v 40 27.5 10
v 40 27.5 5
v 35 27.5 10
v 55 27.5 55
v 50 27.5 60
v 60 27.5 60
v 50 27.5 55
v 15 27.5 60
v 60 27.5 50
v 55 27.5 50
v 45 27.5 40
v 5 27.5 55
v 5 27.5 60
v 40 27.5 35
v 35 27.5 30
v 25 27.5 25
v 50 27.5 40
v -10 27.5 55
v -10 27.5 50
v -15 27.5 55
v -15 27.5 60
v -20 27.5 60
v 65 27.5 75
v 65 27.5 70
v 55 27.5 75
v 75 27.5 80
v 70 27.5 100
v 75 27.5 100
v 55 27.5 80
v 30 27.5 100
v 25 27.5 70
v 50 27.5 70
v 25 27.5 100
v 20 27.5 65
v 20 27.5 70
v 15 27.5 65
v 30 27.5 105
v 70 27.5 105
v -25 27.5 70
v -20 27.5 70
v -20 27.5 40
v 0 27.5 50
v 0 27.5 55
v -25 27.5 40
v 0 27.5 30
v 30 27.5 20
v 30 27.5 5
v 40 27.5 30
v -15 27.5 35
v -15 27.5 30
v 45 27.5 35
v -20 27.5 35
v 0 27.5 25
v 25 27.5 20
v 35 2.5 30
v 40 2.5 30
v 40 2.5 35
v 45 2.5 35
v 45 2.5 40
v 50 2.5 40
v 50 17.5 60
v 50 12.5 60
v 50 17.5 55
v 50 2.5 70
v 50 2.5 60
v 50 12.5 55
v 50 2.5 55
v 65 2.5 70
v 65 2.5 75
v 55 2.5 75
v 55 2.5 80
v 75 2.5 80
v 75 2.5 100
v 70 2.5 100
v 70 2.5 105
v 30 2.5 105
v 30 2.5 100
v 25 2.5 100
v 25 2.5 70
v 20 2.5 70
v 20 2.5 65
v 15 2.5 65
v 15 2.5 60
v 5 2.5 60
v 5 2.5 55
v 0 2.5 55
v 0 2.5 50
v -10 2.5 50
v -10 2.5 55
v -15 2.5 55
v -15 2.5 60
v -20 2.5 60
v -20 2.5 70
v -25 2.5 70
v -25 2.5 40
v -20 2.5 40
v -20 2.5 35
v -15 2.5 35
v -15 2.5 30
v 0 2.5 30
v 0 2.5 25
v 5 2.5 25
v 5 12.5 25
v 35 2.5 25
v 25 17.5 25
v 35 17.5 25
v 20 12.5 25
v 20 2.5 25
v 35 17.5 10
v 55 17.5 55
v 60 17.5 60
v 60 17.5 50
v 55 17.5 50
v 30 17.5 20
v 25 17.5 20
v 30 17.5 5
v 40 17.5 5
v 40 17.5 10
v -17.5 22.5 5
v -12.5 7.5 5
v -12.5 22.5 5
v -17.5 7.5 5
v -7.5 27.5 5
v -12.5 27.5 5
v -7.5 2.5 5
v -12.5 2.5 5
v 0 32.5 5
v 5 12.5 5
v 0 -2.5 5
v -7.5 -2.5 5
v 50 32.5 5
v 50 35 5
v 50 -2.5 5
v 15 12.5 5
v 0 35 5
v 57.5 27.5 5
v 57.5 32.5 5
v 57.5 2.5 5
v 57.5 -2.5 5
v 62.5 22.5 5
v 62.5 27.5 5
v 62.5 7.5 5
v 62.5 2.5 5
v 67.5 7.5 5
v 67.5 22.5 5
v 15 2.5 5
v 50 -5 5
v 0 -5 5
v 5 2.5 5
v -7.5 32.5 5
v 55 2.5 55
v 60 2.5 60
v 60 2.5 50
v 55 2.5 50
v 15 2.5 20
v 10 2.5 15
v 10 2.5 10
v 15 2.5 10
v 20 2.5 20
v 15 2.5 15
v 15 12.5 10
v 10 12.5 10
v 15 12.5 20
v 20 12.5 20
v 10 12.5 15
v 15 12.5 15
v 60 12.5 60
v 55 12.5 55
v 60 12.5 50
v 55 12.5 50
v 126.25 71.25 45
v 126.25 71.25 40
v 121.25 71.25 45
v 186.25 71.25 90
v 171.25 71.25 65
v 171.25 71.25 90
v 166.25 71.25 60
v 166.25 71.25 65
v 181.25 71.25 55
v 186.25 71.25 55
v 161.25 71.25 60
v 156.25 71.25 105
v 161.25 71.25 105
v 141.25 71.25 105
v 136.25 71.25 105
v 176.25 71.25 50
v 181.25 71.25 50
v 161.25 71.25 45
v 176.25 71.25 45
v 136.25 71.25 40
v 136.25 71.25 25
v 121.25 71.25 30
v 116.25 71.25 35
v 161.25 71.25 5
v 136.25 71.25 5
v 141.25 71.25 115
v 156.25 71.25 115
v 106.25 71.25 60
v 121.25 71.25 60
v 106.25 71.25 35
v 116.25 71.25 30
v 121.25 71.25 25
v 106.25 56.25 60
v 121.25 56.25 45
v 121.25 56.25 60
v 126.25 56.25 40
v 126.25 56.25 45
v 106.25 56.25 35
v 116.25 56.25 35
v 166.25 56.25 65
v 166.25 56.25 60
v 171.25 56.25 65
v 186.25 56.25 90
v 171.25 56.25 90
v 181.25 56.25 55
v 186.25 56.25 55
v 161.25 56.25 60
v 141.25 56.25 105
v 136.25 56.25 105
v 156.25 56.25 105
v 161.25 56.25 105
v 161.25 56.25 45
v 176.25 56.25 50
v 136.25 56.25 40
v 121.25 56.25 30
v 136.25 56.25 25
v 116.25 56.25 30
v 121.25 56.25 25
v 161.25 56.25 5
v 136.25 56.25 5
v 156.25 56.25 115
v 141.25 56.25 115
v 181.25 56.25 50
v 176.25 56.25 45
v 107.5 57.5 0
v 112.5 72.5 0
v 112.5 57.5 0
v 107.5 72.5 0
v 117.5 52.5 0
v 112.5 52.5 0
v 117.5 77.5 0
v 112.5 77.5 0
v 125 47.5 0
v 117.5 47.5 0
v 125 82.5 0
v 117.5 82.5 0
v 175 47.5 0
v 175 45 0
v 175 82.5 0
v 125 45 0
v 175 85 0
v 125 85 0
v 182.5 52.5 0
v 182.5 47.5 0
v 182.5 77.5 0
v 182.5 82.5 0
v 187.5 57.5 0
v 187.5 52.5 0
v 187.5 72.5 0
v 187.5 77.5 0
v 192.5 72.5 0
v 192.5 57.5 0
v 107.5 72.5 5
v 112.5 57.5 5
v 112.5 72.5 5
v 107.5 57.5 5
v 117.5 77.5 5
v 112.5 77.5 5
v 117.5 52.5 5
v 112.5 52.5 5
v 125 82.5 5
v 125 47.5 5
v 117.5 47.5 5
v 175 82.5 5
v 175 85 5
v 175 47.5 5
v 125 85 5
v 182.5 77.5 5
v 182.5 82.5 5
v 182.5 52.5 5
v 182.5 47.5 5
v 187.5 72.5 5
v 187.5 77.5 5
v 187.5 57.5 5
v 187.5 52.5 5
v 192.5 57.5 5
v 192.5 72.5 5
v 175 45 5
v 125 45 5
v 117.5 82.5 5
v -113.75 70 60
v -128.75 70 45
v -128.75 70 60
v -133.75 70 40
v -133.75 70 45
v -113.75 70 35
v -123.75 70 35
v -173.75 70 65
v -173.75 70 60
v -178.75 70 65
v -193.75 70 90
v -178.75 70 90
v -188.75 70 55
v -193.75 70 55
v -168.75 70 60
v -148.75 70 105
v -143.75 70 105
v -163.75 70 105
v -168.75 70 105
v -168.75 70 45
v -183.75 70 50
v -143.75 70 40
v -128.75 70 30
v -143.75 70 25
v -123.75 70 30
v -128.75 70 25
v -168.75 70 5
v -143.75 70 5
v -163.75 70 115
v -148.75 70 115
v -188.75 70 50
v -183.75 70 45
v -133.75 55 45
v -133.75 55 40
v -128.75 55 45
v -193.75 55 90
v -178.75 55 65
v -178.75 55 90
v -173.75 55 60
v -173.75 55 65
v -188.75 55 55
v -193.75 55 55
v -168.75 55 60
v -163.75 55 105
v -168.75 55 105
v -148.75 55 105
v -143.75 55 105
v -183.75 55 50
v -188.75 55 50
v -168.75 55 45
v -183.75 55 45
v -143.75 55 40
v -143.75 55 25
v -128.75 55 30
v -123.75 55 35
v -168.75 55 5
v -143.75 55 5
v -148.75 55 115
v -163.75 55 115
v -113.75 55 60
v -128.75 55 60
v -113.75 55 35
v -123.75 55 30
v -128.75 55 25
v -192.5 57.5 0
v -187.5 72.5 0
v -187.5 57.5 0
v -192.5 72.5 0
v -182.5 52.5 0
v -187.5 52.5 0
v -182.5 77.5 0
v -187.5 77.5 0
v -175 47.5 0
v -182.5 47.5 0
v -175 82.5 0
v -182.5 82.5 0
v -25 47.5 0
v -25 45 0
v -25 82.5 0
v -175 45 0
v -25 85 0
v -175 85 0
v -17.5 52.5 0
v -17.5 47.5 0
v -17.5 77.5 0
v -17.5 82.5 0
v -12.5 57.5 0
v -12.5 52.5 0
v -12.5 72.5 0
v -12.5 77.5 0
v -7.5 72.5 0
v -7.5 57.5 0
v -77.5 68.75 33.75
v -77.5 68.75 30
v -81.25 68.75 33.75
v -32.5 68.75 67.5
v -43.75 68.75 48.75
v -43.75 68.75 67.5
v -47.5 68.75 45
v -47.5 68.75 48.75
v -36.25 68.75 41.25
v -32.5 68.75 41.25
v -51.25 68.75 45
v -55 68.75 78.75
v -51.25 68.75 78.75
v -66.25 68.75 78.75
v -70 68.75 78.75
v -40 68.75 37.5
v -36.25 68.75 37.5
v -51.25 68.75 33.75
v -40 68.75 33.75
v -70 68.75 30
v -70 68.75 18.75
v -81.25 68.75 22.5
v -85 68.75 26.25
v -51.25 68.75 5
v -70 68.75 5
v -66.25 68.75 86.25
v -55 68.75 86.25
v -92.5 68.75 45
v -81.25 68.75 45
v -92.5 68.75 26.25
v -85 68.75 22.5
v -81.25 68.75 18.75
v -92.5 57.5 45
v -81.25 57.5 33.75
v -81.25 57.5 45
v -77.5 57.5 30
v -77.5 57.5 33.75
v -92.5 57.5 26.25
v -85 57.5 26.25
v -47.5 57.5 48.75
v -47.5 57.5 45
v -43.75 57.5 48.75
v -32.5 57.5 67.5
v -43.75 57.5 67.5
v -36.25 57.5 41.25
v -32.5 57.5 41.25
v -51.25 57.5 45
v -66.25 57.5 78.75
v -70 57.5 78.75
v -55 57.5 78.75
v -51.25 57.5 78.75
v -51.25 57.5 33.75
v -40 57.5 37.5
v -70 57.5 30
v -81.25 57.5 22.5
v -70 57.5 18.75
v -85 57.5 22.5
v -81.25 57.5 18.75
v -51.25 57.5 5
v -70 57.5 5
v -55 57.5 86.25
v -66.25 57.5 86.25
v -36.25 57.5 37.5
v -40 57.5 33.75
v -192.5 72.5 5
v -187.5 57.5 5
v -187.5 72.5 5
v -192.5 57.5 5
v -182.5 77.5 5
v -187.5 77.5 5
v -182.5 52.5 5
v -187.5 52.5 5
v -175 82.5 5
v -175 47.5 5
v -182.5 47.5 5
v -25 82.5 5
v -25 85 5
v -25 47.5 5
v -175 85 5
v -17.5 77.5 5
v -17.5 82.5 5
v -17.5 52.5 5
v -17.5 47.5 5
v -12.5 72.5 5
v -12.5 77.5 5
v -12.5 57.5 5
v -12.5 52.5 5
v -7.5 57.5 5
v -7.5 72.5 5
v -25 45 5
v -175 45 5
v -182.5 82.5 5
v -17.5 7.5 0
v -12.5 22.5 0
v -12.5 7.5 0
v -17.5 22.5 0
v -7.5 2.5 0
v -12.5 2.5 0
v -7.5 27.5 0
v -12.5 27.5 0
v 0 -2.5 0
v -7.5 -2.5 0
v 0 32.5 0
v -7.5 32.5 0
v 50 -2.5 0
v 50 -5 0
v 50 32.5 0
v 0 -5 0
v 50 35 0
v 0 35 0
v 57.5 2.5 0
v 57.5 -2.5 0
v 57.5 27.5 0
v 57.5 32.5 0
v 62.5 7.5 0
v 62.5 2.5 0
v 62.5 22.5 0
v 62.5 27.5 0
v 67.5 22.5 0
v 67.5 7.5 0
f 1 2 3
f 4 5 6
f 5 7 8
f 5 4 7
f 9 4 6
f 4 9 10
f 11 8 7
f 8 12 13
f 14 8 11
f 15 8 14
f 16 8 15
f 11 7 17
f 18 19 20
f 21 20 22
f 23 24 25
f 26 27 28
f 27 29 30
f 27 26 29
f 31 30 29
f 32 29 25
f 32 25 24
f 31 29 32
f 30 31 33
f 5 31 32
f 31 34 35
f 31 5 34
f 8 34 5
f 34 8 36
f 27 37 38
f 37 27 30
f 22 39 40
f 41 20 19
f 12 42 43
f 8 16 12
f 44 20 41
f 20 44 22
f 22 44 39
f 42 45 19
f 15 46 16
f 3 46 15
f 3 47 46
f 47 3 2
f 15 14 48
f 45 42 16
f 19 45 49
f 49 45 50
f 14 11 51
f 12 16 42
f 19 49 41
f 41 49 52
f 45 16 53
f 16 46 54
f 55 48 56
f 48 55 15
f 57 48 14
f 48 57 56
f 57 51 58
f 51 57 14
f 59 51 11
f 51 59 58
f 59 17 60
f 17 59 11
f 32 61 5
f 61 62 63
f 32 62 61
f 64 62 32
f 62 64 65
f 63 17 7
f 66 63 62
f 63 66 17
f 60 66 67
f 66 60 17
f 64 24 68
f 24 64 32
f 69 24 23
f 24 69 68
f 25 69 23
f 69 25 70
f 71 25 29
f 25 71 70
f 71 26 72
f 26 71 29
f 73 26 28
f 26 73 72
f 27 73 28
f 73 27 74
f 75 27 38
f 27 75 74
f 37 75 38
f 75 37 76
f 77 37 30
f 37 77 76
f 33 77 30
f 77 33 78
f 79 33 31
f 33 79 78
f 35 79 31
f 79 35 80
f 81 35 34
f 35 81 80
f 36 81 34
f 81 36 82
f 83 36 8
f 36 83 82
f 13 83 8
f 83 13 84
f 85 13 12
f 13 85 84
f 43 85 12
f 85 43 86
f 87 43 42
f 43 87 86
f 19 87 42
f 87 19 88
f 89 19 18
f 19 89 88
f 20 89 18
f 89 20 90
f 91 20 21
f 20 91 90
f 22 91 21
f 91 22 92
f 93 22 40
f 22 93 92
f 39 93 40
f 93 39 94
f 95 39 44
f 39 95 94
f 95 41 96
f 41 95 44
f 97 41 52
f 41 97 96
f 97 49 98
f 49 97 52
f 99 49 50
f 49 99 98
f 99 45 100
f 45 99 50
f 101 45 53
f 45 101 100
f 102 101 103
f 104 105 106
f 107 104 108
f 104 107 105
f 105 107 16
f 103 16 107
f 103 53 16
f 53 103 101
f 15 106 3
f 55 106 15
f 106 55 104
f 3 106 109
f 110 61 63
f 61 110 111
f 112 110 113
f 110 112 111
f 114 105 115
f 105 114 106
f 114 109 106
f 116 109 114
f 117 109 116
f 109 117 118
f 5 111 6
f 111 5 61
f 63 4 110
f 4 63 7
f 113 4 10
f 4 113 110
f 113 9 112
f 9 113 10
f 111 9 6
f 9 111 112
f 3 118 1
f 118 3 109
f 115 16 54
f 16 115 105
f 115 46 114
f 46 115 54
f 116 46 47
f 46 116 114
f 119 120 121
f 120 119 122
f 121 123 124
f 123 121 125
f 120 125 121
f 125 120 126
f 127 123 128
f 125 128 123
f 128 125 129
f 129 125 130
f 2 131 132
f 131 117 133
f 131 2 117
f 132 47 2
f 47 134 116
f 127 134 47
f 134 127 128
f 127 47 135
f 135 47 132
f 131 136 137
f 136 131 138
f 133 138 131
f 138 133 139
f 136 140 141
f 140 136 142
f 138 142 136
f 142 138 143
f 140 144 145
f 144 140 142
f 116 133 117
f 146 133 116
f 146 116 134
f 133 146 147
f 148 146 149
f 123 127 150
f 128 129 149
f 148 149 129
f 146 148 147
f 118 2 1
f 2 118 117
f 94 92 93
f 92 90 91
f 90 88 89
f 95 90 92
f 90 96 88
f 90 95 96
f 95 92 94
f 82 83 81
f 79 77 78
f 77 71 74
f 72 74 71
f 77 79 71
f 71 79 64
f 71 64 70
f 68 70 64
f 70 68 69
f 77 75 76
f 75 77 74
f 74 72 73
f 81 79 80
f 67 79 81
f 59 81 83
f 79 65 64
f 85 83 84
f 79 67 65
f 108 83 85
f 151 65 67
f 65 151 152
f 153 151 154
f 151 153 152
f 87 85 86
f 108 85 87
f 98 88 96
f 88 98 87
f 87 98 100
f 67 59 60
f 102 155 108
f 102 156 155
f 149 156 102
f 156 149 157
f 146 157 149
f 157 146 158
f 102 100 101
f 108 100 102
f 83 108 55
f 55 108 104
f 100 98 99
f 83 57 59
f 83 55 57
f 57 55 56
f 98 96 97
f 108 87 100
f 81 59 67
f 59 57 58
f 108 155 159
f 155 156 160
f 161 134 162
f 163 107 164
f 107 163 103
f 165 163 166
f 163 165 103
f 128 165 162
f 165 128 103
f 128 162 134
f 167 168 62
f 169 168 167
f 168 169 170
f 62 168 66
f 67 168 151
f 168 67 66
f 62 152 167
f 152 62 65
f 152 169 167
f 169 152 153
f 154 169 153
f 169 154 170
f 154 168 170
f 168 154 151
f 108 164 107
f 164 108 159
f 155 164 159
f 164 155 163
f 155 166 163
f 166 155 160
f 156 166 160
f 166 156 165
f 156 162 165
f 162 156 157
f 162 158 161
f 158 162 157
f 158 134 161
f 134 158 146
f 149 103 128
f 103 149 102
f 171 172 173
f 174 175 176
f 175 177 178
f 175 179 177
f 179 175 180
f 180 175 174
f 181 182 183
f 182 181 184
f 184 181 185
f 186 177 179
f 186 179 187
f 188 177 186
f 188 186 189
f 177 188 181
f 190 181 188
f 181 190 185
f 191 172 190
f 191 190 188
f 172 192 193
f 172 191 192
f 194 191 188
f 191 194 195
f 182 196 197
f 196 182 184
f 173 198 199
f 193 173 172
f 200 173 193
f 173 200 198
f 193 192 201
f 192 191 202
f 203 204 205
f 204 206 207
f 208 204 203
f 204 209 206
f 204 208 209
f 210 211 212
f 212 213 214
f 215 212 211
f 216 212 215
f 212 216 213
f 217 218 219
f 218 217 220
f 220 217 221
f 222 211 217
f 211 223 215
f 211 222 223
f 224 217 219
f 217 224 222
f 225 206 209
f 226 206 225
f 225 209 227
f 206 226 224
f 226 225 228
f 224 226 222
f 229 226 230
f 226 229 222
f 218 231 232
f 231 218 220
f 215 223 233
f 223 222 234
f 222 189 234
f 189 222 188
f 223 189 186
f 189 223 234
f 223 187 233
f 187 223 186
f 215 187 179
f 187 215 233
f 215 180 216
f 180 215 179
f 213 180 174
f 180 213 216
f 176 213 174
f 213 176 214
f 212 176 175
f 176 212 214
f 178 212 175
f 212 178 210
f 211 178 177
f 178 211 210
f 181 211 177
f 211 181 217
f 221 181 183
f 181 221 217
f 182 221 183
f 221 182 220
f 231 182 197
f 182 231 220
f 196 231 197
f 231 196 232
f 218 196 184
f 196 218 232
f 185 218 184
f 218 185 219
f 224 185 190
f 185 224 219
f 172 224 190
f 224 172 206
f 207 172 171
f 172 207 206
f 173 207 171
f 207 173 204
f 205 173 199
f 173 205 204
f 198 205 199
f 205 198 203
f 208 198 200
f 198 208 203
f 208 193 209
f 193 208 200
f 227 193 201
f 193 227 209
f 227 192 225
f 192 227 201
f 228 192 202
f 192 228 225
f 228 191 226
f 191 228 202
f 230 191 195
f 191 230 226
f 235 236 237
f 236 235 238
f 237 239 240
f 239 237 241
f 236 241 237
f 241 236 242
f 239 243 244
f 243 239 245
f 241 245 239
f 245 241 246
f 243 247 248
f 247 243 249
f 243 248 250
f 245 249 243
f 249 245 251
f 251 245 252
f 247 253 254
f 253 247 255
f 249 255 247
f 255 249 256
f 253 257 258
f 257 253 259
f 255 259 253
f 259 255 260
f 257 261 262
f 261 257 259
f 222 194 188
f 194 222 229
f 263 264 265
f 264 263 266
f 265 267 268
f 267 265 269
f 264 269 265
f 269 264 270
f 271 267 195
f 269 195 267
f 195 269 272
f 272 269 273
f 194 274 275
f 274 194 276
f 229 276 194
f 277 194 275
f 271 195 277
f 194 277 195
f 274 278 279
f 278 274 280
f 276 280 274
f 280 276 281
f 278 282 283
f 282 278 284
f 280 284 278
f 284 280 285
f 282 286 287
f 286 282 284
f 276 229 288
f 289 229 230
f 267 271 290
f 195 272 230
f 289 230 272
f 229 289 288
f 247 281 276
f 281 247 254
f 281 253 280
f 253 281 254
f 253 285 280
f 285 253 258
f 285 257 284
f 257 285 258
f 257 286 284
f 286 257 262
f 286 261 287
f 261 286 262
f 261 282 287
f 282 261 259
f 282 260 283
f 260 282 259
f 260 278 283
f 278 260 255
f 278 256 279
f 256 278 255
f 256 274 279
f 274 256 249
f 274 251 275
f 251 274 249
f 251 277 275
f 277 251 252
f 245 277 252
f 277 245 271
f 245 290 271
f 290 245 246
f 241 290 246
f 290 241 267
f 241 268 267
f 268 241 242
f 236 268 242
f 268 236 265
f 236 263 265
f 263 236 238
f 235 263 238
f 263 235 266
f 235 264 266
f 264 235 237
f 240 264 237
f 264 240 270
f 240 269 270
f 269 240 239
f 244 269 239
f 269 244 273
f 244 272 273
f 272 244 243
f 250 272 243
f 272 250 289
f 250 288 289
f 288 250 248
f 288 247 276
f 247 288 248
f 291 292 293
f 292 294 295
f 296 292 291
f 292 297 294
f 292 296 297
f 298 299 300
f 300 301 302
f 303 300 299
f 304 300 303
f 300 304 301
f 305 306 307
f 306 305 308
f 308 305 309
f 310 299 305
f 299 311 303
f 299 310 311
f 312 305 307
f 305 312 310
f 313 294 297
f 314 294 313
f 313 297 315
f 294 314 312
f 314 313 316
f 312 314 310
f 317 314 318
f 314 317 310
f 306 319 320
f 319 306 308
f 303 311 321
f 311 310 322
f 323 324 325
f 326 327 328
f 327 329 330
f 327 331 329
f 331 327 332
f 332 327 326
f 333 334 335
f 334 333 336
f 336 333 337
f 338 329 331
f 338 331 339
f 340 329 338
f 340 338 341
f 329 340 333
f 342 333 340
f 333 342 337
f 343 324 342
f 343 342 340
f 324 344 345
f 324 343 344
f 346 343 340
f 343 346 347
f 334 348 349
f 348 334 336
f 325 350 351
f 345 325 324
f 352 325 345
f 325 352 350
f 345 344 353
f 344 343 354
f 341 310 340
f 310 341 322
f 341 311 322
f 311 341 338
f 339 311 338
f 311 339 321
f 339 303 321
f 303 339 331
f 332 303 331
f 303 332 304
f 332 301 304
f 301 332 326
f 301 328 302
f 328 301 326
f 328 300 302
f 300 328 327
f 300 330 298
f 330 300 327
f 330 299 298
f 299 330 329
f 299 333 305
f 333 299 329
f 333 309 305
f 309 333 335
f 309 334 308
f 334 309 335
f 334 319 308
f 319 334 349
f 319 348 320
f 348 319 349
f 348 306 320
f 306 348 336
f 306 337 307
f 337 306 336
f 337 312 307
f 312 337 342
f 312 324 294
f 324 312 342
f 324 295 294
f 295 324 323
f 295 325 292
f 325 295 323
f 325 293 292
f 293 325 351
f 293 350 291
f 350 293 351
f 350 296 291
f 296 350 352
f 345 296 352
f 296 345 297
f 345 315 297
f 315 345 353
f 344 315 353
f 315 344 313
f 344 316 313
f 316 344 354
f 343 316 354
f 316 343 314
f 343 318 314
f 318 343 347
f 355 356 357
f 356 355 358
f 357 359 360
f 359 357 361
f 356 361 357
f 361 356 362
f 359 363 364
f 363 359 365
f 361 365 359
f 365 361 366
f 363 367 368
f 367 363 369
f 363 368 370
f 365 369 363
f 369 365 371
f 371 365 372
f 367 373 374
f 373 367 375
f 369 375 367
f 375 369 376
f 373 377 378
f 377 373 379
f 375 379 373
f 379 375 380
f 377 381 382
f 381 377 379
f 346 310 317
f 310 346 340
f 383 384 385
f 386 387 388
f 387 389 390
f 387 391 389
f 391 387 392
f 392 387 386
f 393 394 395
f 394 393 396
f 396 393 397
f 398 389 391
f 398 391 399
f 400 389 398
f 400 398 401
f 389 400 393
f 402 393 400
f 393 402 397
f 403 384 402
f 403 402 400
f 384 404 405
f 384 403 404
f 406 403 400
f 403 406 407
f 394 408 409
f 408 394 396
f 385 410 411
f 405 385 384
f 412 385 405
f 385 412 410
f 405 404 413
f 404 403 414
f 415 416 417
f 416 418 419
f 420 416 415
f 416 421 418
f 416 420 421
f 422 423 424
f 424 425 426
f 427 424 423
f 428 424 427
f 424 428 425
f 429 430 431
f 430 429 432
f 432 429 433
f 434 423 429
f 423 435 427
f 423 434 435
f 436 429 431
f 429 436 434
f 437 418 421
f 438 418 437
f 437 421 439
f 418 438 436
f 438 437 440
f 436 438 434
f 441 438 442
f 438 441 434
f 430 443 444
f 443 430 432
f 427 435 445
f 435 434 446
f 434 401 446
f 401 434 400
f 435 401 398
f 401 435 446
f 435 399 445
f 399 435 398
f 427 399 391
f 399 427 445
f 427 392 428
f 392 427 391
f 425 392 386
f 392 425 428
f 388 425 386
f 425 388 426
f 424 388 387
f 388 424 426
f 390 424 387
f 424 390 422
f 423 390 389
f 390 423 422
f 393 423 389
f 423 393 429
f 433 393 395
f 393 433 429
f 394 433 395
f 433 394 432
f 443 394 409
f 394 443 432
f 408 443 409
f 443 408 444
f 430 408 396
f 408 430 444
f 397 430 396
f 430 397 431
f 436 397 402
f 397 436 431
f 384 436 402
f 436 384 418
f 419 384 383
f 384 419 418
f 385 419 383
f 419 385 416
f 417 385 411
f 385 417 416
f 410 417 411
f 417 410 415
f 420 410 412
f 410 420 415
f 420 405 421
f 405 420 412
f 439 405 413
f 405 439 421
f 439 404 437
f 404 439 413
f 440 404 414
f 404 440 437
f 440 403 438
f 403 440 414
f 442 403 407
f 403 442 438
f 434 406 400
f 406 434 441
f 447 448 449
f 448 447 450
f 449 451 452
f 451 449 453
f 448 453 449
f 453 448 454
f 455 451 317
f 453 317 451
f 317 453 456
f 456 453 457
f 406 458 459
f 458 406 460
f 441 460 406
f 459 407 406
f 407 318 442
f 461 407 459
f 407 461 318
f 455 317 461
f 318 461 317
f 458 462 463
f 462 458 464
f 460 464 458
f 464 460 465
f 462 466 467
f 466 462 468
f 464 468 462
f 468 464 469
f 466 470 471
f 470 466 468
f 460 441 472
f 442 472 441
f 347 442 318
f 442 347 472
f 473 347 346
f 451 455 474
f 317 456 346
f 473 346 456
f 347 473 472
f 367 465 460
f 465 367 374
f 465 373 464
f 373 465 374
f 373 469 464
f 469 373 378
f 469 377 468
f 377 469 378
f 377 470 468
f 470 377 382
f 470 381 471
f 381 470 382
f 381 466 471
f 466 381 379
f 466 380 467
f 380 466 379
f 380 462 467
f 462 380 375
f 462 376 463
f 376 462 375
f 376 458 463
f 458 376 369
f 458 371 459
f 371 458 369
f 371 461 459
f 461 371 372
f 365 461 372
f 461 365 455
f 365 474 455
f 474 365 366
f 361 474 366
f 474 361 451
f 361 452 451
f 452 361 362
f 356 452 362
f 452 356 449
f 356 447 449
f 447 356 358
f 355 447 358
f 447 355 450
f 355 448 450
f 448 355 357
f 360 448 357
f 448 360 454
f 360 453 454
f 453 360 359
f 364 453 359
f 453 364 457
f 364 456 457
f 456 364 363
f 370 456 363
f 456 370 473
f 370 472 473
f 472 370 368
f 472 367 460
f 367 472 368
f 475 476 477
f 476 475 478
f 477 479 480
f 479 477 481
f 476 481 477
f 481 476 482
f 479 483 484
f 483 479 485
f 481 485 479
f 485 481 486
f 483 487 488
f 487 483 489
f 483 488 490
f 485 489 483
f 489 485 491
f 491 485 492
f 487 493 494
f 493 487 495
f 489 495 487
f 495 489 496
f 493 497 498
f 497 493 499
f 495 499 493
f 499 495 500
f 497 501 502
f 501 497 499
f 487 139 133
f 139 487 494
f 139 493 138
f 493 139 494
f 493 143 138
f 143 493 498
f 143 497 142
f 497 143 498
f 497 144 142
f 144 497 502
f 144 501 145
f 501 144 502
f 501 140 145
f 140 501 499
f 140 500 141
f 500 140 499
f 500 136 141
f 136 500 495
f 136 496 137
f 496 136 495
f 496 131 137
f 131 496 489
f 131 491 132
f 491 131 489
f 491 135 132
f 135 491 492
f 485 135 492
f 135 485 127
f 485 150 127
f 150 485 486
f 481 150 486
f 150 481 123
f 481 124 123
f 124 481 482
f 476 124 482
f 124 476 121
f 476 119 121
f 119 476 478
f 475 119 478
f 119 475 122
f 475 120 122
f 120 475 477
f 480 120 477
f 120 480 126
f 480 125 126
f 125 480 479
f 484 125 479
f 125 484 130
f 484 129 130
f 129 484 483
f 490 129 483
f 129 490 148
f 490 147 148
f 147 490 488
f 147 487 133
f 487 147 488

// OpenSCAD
w = 5;
merged_dino = false;
eye_spacing = 0.4;
base_x_blocks = 10;
base_y_blocks = 6;

part = "DEMO"; // [DINO, EYE, CACTUS, BASE, DEMO]

module chrome_dino(w, merged = false) {
    module body(w) {
        difference() {
            polygon([
                [0, 0],
                [0, w],
                [-3 * w, w],
                [-3 * w, 2 * w],
                [-4 * w, 2 * w],
                [-4 * w, 3 * w],
                [-5 * w, 3 * w],
                [-5 * w, 9 * w],
                [-4 * w, 9 * w],
                [-4 * w, 7 * w],
                [-3 * w, 7 * w],
                [-3 * w, 6 * w],
                [-2 * w, 6 * w],
                [-2 * w, 5 * w],
                [0, 5 * w],
                [0, 6 * w],
                [w, 6 * w],
                [w, 7 * w],
                [3 * w, 7 * w],
                [3 * w, 8 * w],
                [4 * w, 8 * w],
                [4 * w, 9 * w],
                [5 * w, 9 * w],
                [5 * w, 15 * w],
                [6 * w, 15 * w],
                [6 * w, 16 * w],
                [14 * w, 16 * w],
                [14 * w, 15 * w],
                [15 * w, 15 * w],
                [15 * w, 11 * w],
                [11 * w, 11 * w],
                [11 * w, 10 * w],
                [13 * w, 10 * w],
                [13 * w, 9 * w],
                [10 * w, 9 * w],
                [10 * w, 3 * w],
                [9 * w, 3 * w],
                [9 * w, 2 * w],
                [8 * w, 2 * w],
                [8 * w, w],
                [7 * w, w],
                [7 * w, 0],
            ]); 
        
          translate([7 * w, 14 * w]) square(w, center = true);
        }
    }

    module hand(w) {
        polygon([
            [10 * w, 7 * w],
            [12 * w, 7 * w],
            [12 * w, 5 * w],
            [11 * w, 5 * w],
            [11 * w, 6 * w],
            [10 * w, 6 * w]
        ]);
    }

    module leg_l(w) {
        polygon([
            [5 * w, 0],
            [5 * w, -w],
            [6 * w, -w],
            [6 * w, -4 * w],
            [8 * w, -4 * w],
            [8 * w, -3 * w],
            [7 * w, -3 * w],
            [7 * w, 0],
        ]);
    }

    module leg_r(w) {
        polygon([
            [w, 0],
            [w, -4 * w],
            [3 * w, -4 * w],
            [3 * w, -3 * w],
            [2 * w, -3 * w],
            [2 * w, -2 * w],
            [3 * w, -2 * w],
            [3 * w, -w],
            [4 * w, -w],
            [4 * w, 0]
        ]);
    }

    module dino_left(w) {      
        linear_extrude(w * 2.5) body(w);
        linear_extrude(w * 2) {
            hand(w);
            leg_l(w);
        }
    }

    module dino_right(w) {
        linear_extrude(w * 2.5) mirror([1, 0, 0]) body(w);
        linear_extrude(w * 2) mirror([1, 0, 0]) {
            hand(w);
            leg_r(w);
        }
    }
    
    if(merged) {
        dino_left(w);
        translate([0, 0, w * 5]) rotate([0, 180, 0]) dino_right(w);
    } else {
        translate([w * 6, 0, 0]) dino_left(w);
        translate([w * -6, 0, 0]) dino_right(w);
    }
}

module cactus(w) {
    linear_extrude(w * 3) {
        translate([2 * w, w * 7]) scale(w) 
        for(pt = px_polygon([
            [0, 2],
            [3, 2],
            [5, 4],
            [5, 10],
            [5, 10],
            [3, 10],
            [3, 6],
            [0, 4],
            
        ], filled = true)) {
            translate(pt) square(1);
        }
        translate([-2 * w, w * 5]) scale(w) 
        for(pt = px_polygon([
            [-1, 0],
            [-3, 0],
            [-6, 2],
            [-6, 6],
            [-6, 6],
            [-4, 6],
            [-4, 4],
            [-1, 2],
            
        ], filled = true)) {
            translate(pt) square(1);
        }
        scale(w) 
        for(pt = px_polygon([
            [-2, 0],
            [2, 0],
            [2, 20],
            [1, 22],
            [0, 22],
            [-1, 22],
            [-2, 20]
        ], filled = true)) {
            translate(pt) square(1);
        }
    }
}

module base(w, base_x_blocks, base_y_blocks) {
   linear_extrude(w) {
       translate([0, -w]) 
           square([base_x_blocks * w, base_y_blocks * w + 2 * w]);
       translate([0, base_y_blocks * w / 2]) scale(w)
       for(p = px_circle(base_y_blocks / 2, filled = true)) {
           translate(p)
               square(1, center = true);
       }
       translate([base_x_blocks * w, base_y_blocks * w / 2]) scale(w)
       for(p = px_circle(base_y_blocks / 2, filled = true)) {
           translate(p)
               square(1, center = true);
       }
   }   
}

module eye(w, eye_spacing) {
    translate([0, 0, -eye_spacing]) 
        rotate([0, -90, 0]) 
            linear_extrude(w * 5) 
                offset(delta = -eye_spacing) square(w);
}

if(part == "DINO") {
    chrome_dino(w, merged_dino);
}
else if(part == "EYE") {
    eye(w, eye_spacing);
}
else if(part == "CACTUS") {
    cactus(w);
}
else if(part == "BASE") { 
   base(w, base_x_blocks, base_y_blocks);
}
else if(part == "DEMO") {
    wd = 5;
    translate([0, wd * 5.5, wd * 5]) rotate([90, 0, 0])  {
        color("DimGray") chrome_dino(wd, true);
        color("white") 
            linear_extrude(wd * 5)
                translate([7 * wd, 14 * wd]) square(wd, center = true);
    }
    color("white") base(wd, 10, 6);
    
    translate([wd * 25, wd * 10, 0]) {
        translate([wd * 4.25, wd * 4.25, 0]) color("SlateGray") rotate([90, 0, 0])  
            cactus(wd);
        color("white") base(wd, 10, 6);
    }
    
    translate([-wd * 35, wd * 10, 0]) {
        color("SlateGray") {
            translate([wd * 4.25, wd * 4, 0]) rotate([90, 0, 0])  
                mirror([1, 0, 0]) cactus(wd);
                
             scale(0.75)
                 translate([wd * 30, wd * 5, 0]) rotate([90, 0, 0])  
                    cactus(wd);       
        }
         color("white") base(wd, 30, 6);                
    }
    
}

    
/**
 * The dotSCAD library
 * @copyright Justin Lin, 2017
 * @license https://opensource.org/licenses/lgpl-3.0.html
 *
 * @see https://github.com/JustinSDK/dotSCAD
*/

/**
* in_shape.scad
*
* @copyright Justin Lin, 2019
* @license https://opensource.org/licenses/lgpl-3.0.html
*
* @see https://openhome.cc/eGossip/OpenSCAD/lib-in_shape.html
*
**/


function _in_shape_in_line_equation(edge, pt) = 
    let(
        x1 = edge[0][0],
        y1 = edge[0][1],
        x2 = edge[1][0],
        y2 = edge[1][1],
        a = (y2 - y1) / (x2 - x1),
        b = y1 - a * x1
    )
    (pt[1] == a * pt[0] + b);

function _in_shape_in_any_edges(edges, pt, epsilon) = 
    let(
        leng = len(edges),
        maybe_last = [for(i = 0; i < leng && !__in_line(edges[i], pt, epsilon); i = i + 1) i][leng - 1] 
    )
    is_undef(maybe_last);

function _in_shape_interpolate_x(y, p1, p2) = 
    p1[1] == p2[1] ? p1[0] : (
        p1[0] + (p2[0] - p1[0]) * (y - p1[1]) / (p2[1] - p1[1])
    );
    
function _in_shape_does_pt_cross(pts, i, j, pt) = 
    ((pts[i][1] > pt[1]) != (pts[j][1] > pt[1])) &&
    (pt[0] < _in_shape_interpolate_x(pt[1], pts[i], pts[j]));
    

function _in_shape_sub(shapt_pts, leng, pt, cond, i, j) =
    j == leng ? cond : (
        _in_shape_does_pt_cross(shapt_pts, i, j, pt) ? 
            _in_shape_sub(shapt_pts, leng, pt, !cond, j, j + 1) :
            _in_shape_sub(shapt_pts, leng, pt, cond, j, j + 1)
    );
 
function in_shape(shapt_pts, pt, include_edge = false, epsilon = 0.0001) = 
    let(
        leng = len(shapt_pts),
        edges = __lines_from(shapt_pts, true)
    )
    _in_shape_in_any_edges(edges, pt, epsilon) ? include_edge : 
    _in_shape_sub(shapt_pts, leng, pt, false, leng - 1, 0);

/**
* px_polygon.scad
*
* @copyright Justin Lin, 2019
* @license https://opensource.org/licenses/lgpl-3.0.html
*
* @see https://openhome.cc/eGossip/OpenSCAD/lib2-px_polygon.html
*
**/ 

function px_polygon(points, filled = false) =
    filled ?
    let(
        xs = [for(pt = points) pt[0]],
        ys = [for(pt = points) pt[1]],
        max_x = max(xs),
        min_x = min(xs),
        max_y = max(ys),
        min_y = min(ys)
    )
    [
        for(y = min_y; y <= max_y; y = y + 1)
            for(x = min_x; x <= max_x; x = x + 1)
                let(pt = [x, y])
                if(in_shape(points, pt, true)) pt
    ]
    : 
    px_polyline(
        concat(points, [points[len(points) - 1], points[0]])
    );
    

function __in_line(line_pts, pt, epsilon = 0.0001) =
    let(
        pts = len(line_pts[0]) == 2 ? [for(p = line_pts) __to3d(p)] : line_pts,
        pt3d = len(pt) == 2 ? __to3d(pt) : pt,
        v1 = pts[0] - pt3d, 
        v2 = pts[1] - pt3d
    )
    (norm(cross(v1, v2)) < epsilon) && ((v1 * v2) <= epsilon);

/**
* px_polyline.scad
*
* @copyright Justin Lin, 2019
* @license https://opensource.org/licenses/lgpl-3.0.html
*
* @see https://openhome.cc/eGossip/OpenSCAD/lib2-px_polyline.html
*
**/ 


function px_polyline(points) =
    let(
        is_2d = len(points[0]) == 2,
        pts = is_2d ? [for(pt = points) __to3d(pt)] : points,
        polyline = [for(line =  __lines_from(pts)) each px_line(line[0], line[1])]
    )
    is_2d ? [for(pt = polyline) __to2d(pt)] : polyline;

/**
* px_line.scad
*
* @copyright Justin Lin, 2019
* @license https://opensource.org/licenses/lgpl-3.0.html
*
* @see https://openhome.cc/eGossip/OpenSCAD/lib2-px_line.html
*
**/ 


function _px_line_zsgn(a) = a == 0 ? a : a / abs(a);
    
// x-dominant
function _px_line_xdominant_y(y, yd, sy) = yd >= 0 ? y + sy : y;
function _px_line_xdominant_yd(yd, ax, ay) = (yd >= 0 ? yd - ax : yd) + ay;
function _px_line_xdominant_z(z, zd, sz) = zd >= 0 ? z + sz : z;
function _px_line_xdominant_zd(zd, ax, az) = (zd >= 0 ? zd - ax : zd) + az;

function _px_line_xdominant(start, end, a, s) = 
    let(
        x = start[0],
        y = start[1],
        z = start[2],
        ax = a[0],
        ay = a[1],
        az = a[2],
        sx = s[0],
        sy = s[1],
        sz = s[2],        
        shrx = floor(ax / 2),
        yd = ay - shrx,
        zd = az - shrx,
        endx = end[0]
    )
    concat(
        [start], 
        _px_line_xdominant_sub(
            x + sx, 
            _px_line_xdominant_y(y, yd, sy), 
            _px_line_xdominant_z(z, zd, sz), 
            endx, 
            a, 
            s, 
            _px_line_xdominant_yd(yd, ax, ay), 
            _px_line_xdominant_zd(zd, ax, az)
        )
    );

function _px_line_xdominant_sub(x, y, z, endx, a, s, yd, zd) = 
    let(
        ax = a[0],
        ay = a[1],
        az = a[2],
        sx = s[0],
        sy = s[1],
        sz = s[2]
    )
    x == endx ? [] : 
        concat([[x, y, z]], 
            _px_line_xdominant_sub(
                x + sx, 
                _px_line_xdominant_y(y, yd, sy), 
                _px_line_xdominant_z(z, zd, sz), 
                endx, 
                a, 
                s, 
                _px_line_xdominant_yd(yd, ax, ay), 
                _px_line_xdominant_zd(zd, ax, az)
            )
        );
        
// y-dominant
function _px_line_ydominant_x(x, xd, sx) = xd >= 0 ? x + sx : x;
function _px_line_ydominant_xd(xd, ax, ay) = (xd >= 0 ? xd - ay : xd) + ax;
function _px_line_ydominant_z(z, zd, sz) = zd >= 0 ? z + sz : z;
function _px_line_ydominant_zd(zd, ay, az) = (zd >= 0 ? zd - ay : zd) + az;
        
function _px_line_ydominant(start, end, a, s) = 
    let(
        x = start[0],
        y = start[1],
        z = start[2],
        ax = a[0],
        ay = a[1],
        az = a[2],
        sx = s[0],
        sy = s[1],
        sz = s[2],        
        shry = floor(ay / 2),
        xd = ax - shry,
        zd = az - shry,
        endy = end[1]
    )
    concat(
        [start], 
        _px_line_ydominant_sub(
            _px_line_ydominant_x(x, xd, sx), 
            y + sy,
            _px_line_ydominant_z(z, zd, sz), 
            endy, 
            a, 
            s, 
            _px_line_ydominant_xd(xd, ax, ay), 
            _px_line_ydominant_zd(zd, ay, az)
        )
    );

function _px_line_ydominant_sub(x, y, z, endy, a, s, xd, zd) = 
    let(
        ax = a[0],
        ay = a[1],
        az = a[2],
        sx = s[0],
        sy = s[1],
        sz = s[2]
    )
    y == endy ? [] : 
        concat([[x, y, z]], 
            _px_line_ydominant_sub(
                _px_line_ydominant_x(x, xd, sx), 
                y + sy,
                _px_line_ydominant_z(z, zd, sz), 
                endy, 
                a, 
                s, 
                _px_line_ydominant_xd(xd, ax, ay), 
                _px_line_ydominant_zd(zd, ay, az)
            )
        );

// z-dominant
function _px_line_zdominant_x(x, xd, sx) = xd >= 0 ? x + sx : x;
function _px_line_zdominant_xd(xd, ax, az) = (xd >= 0 ? xd - az : xd) + ax;

function _px_line_zdominant_y(y, yd, sy) = yd >= 0 ? y + sy : y;
function _px_line_zdominant_yd(yd, ay, az) = (yd >= 0 ? yd - az : yd) + ay;
        
function _px_line_zdominant(start, end, a, s) = 
    let(
        x = start[0],
        y = start[1],
        z = start[2],
        ax = a[0],
        ay = a[1],
        az = a[2],
        sx = s[0],
        sy = s[1],
        sz = s[2],        
        shrz = floor(az / 2),
        xd = ax - shrz,
        yd = ay - shrz,
        endz = end[2]
    )
    concat(
        [start], 
        _px_line_zdominant_sub(
            _px_line_zdominant_x(x, xd, sx), 
            _px_line_zdominant_y(y, yd, sy), 
            z + sz,
            endz, 
            a, 
            s, 
            _px_line_zdominant_xd(xd, ax, az), 
            _px_line_zdominant_yd(yd, ay, az)
        )
    );

function _px_line_zdominant_sub(x, y, z, endz, a, s, xd, yd) = 
    let(
        ax = a[0],
        ay = a[1],
        az = a[2],
        sx = s[0],
        sy = s[1],
        sz = s[2]
    )
    z == endz ? [] : 
        concat([[x, y, z]], 
            _px_line_zdominant_sub(
                _px_line_zdominant_x(x, xd, sx), 
                _px_line_zdominant_y(y, yd, sy), 
                z + sz,
                endz, 
                a, 
                s, 
                _px_line_zdominant_xd(xd, ax, az), 
                _px_line_zdominant_yd(yd, ay, az)
            )
        );
        
function px_line(p1, p2) = 
    let(
        is_2d = len(p1) == 2,
        start_pt = is_2d ? __to3d(p1) : p1,
        end_pt = is_2d ? __to3d(p2) : p2,
        dt = end_pt - start_pt,
        ax = floor(abs(dt[0]) * 2),
        ay = floor(abs(dt[1]) * 2),
        az = floor(abs(dt[2]) * 2),
        sx = _px_line_zsgn(dt[0]),
        sy = _px_line_zsgn(dt[1]),
        sz = _px_line_zsgn(dt[2]),
        points = ax >= max(ay, az) ? _px_line_xdominant(start_pt, end_pt, [ax, ay, az], [sx, sy, sz]) : (
            ay >= max(ax, az) ? _px_line_ydominant(start_pt, end_pt, [ax, ay, az], [sx, sy, sz]) :
                _px_line_zdominant(start_pt, end_pt, [ax, ay, az], [sx, sy, sz])
        )
    )   
    is_2d ? [for(pt = points) __to2d(pt)] : points;

/**
* px_circle.scad
*
* @copyright Justin Lin, 2019
* @license https://opensource.org/licenses/lgpl-3.0.html
*
* @see https://openhome.cc/eGossip/OpenSCAD/lib2-px_circle.html
*
**/ 

function _px_circle_y(f, y) = f >= 0 ? y - 1 : y;
function _px_circle_ddf_y(f, ddf_y) = f >= 0 ? ddf_y + 2 : ddf_y;
function _px_circle_f(f, ddf_y) = f >= 0 ? f + ddf_y : f;

function _px_circle(f, ddf_x, ddf_y, x, y, filled) = 
    x >= y ? [] : 
    let(
        ny = _px_circle_y(f, y),
        nddf_y = _px_circle_ddf_y(f, ddf_y),
        nx = x + 1,
        nddf_x = ddf_x + 2,
        nf = _px_circle_f(f, ddf_y) + nddf_x
    )
    concat(
        filled ? 
            concat(
               [for(xi = -nx; xi <= nx; xi = xi + 1) [xi, -ny]],
               [for(xi = -ny; xi <= ny; xi = xi + 1) [xi, -nx]],
               [for(xi = -ny; xi <= ny; xi = xi + 1) [xi, nx]],
               [for(xi = -nx; xi <= nx; xi = xi + 1) [xi, ny]]              
            )
            :
            [  
                [-nx, -ny], [nx, -ny],                 
                [-ny, -nx], [ny, -nx],
                [-ny, nx], [ny, nx],
                [-nx, ny], [nx, ny]
            ],
        _px_circle(nf, nddf_x, nddf_y, nx, ny, filled)
    );
    
function px_circle(radius, filled = false) =
    let(
        f = 1 - radius,
        ddf_x = 1,
        ddf_y = -2 * radius,
        x = 0,
        y = radius
    )
    concat(
        filled ? 
            concat(
                [[0, radius], [0, -radius]],
                [for(xi = -radius; xi <= radius; xi = xi + 1) [xi, 0]]
            )
            : 
            [
                [0, -radius],                
                [-radius, 0], 
                [radius, 0],
                [0, radius]
            ],
        _px_circle(f, ddf_x, ddf_y, x, y, filled)
    );

function __to3d(p) = [p[0], p[1], 0];

function __lines_from(pts, closed = false) = 
    let(
        leng = len(pts),
        endi = leng - 1
    )
    concat(
        [for(i = 0; i < endi; i = i + 1) [pts[i], pts[i + 1]]], 
        closed ? [[pts[len(pts) - 1], pts[0]]] : []
    );
    

function __to2d(p) = [p[0], p[1]];
